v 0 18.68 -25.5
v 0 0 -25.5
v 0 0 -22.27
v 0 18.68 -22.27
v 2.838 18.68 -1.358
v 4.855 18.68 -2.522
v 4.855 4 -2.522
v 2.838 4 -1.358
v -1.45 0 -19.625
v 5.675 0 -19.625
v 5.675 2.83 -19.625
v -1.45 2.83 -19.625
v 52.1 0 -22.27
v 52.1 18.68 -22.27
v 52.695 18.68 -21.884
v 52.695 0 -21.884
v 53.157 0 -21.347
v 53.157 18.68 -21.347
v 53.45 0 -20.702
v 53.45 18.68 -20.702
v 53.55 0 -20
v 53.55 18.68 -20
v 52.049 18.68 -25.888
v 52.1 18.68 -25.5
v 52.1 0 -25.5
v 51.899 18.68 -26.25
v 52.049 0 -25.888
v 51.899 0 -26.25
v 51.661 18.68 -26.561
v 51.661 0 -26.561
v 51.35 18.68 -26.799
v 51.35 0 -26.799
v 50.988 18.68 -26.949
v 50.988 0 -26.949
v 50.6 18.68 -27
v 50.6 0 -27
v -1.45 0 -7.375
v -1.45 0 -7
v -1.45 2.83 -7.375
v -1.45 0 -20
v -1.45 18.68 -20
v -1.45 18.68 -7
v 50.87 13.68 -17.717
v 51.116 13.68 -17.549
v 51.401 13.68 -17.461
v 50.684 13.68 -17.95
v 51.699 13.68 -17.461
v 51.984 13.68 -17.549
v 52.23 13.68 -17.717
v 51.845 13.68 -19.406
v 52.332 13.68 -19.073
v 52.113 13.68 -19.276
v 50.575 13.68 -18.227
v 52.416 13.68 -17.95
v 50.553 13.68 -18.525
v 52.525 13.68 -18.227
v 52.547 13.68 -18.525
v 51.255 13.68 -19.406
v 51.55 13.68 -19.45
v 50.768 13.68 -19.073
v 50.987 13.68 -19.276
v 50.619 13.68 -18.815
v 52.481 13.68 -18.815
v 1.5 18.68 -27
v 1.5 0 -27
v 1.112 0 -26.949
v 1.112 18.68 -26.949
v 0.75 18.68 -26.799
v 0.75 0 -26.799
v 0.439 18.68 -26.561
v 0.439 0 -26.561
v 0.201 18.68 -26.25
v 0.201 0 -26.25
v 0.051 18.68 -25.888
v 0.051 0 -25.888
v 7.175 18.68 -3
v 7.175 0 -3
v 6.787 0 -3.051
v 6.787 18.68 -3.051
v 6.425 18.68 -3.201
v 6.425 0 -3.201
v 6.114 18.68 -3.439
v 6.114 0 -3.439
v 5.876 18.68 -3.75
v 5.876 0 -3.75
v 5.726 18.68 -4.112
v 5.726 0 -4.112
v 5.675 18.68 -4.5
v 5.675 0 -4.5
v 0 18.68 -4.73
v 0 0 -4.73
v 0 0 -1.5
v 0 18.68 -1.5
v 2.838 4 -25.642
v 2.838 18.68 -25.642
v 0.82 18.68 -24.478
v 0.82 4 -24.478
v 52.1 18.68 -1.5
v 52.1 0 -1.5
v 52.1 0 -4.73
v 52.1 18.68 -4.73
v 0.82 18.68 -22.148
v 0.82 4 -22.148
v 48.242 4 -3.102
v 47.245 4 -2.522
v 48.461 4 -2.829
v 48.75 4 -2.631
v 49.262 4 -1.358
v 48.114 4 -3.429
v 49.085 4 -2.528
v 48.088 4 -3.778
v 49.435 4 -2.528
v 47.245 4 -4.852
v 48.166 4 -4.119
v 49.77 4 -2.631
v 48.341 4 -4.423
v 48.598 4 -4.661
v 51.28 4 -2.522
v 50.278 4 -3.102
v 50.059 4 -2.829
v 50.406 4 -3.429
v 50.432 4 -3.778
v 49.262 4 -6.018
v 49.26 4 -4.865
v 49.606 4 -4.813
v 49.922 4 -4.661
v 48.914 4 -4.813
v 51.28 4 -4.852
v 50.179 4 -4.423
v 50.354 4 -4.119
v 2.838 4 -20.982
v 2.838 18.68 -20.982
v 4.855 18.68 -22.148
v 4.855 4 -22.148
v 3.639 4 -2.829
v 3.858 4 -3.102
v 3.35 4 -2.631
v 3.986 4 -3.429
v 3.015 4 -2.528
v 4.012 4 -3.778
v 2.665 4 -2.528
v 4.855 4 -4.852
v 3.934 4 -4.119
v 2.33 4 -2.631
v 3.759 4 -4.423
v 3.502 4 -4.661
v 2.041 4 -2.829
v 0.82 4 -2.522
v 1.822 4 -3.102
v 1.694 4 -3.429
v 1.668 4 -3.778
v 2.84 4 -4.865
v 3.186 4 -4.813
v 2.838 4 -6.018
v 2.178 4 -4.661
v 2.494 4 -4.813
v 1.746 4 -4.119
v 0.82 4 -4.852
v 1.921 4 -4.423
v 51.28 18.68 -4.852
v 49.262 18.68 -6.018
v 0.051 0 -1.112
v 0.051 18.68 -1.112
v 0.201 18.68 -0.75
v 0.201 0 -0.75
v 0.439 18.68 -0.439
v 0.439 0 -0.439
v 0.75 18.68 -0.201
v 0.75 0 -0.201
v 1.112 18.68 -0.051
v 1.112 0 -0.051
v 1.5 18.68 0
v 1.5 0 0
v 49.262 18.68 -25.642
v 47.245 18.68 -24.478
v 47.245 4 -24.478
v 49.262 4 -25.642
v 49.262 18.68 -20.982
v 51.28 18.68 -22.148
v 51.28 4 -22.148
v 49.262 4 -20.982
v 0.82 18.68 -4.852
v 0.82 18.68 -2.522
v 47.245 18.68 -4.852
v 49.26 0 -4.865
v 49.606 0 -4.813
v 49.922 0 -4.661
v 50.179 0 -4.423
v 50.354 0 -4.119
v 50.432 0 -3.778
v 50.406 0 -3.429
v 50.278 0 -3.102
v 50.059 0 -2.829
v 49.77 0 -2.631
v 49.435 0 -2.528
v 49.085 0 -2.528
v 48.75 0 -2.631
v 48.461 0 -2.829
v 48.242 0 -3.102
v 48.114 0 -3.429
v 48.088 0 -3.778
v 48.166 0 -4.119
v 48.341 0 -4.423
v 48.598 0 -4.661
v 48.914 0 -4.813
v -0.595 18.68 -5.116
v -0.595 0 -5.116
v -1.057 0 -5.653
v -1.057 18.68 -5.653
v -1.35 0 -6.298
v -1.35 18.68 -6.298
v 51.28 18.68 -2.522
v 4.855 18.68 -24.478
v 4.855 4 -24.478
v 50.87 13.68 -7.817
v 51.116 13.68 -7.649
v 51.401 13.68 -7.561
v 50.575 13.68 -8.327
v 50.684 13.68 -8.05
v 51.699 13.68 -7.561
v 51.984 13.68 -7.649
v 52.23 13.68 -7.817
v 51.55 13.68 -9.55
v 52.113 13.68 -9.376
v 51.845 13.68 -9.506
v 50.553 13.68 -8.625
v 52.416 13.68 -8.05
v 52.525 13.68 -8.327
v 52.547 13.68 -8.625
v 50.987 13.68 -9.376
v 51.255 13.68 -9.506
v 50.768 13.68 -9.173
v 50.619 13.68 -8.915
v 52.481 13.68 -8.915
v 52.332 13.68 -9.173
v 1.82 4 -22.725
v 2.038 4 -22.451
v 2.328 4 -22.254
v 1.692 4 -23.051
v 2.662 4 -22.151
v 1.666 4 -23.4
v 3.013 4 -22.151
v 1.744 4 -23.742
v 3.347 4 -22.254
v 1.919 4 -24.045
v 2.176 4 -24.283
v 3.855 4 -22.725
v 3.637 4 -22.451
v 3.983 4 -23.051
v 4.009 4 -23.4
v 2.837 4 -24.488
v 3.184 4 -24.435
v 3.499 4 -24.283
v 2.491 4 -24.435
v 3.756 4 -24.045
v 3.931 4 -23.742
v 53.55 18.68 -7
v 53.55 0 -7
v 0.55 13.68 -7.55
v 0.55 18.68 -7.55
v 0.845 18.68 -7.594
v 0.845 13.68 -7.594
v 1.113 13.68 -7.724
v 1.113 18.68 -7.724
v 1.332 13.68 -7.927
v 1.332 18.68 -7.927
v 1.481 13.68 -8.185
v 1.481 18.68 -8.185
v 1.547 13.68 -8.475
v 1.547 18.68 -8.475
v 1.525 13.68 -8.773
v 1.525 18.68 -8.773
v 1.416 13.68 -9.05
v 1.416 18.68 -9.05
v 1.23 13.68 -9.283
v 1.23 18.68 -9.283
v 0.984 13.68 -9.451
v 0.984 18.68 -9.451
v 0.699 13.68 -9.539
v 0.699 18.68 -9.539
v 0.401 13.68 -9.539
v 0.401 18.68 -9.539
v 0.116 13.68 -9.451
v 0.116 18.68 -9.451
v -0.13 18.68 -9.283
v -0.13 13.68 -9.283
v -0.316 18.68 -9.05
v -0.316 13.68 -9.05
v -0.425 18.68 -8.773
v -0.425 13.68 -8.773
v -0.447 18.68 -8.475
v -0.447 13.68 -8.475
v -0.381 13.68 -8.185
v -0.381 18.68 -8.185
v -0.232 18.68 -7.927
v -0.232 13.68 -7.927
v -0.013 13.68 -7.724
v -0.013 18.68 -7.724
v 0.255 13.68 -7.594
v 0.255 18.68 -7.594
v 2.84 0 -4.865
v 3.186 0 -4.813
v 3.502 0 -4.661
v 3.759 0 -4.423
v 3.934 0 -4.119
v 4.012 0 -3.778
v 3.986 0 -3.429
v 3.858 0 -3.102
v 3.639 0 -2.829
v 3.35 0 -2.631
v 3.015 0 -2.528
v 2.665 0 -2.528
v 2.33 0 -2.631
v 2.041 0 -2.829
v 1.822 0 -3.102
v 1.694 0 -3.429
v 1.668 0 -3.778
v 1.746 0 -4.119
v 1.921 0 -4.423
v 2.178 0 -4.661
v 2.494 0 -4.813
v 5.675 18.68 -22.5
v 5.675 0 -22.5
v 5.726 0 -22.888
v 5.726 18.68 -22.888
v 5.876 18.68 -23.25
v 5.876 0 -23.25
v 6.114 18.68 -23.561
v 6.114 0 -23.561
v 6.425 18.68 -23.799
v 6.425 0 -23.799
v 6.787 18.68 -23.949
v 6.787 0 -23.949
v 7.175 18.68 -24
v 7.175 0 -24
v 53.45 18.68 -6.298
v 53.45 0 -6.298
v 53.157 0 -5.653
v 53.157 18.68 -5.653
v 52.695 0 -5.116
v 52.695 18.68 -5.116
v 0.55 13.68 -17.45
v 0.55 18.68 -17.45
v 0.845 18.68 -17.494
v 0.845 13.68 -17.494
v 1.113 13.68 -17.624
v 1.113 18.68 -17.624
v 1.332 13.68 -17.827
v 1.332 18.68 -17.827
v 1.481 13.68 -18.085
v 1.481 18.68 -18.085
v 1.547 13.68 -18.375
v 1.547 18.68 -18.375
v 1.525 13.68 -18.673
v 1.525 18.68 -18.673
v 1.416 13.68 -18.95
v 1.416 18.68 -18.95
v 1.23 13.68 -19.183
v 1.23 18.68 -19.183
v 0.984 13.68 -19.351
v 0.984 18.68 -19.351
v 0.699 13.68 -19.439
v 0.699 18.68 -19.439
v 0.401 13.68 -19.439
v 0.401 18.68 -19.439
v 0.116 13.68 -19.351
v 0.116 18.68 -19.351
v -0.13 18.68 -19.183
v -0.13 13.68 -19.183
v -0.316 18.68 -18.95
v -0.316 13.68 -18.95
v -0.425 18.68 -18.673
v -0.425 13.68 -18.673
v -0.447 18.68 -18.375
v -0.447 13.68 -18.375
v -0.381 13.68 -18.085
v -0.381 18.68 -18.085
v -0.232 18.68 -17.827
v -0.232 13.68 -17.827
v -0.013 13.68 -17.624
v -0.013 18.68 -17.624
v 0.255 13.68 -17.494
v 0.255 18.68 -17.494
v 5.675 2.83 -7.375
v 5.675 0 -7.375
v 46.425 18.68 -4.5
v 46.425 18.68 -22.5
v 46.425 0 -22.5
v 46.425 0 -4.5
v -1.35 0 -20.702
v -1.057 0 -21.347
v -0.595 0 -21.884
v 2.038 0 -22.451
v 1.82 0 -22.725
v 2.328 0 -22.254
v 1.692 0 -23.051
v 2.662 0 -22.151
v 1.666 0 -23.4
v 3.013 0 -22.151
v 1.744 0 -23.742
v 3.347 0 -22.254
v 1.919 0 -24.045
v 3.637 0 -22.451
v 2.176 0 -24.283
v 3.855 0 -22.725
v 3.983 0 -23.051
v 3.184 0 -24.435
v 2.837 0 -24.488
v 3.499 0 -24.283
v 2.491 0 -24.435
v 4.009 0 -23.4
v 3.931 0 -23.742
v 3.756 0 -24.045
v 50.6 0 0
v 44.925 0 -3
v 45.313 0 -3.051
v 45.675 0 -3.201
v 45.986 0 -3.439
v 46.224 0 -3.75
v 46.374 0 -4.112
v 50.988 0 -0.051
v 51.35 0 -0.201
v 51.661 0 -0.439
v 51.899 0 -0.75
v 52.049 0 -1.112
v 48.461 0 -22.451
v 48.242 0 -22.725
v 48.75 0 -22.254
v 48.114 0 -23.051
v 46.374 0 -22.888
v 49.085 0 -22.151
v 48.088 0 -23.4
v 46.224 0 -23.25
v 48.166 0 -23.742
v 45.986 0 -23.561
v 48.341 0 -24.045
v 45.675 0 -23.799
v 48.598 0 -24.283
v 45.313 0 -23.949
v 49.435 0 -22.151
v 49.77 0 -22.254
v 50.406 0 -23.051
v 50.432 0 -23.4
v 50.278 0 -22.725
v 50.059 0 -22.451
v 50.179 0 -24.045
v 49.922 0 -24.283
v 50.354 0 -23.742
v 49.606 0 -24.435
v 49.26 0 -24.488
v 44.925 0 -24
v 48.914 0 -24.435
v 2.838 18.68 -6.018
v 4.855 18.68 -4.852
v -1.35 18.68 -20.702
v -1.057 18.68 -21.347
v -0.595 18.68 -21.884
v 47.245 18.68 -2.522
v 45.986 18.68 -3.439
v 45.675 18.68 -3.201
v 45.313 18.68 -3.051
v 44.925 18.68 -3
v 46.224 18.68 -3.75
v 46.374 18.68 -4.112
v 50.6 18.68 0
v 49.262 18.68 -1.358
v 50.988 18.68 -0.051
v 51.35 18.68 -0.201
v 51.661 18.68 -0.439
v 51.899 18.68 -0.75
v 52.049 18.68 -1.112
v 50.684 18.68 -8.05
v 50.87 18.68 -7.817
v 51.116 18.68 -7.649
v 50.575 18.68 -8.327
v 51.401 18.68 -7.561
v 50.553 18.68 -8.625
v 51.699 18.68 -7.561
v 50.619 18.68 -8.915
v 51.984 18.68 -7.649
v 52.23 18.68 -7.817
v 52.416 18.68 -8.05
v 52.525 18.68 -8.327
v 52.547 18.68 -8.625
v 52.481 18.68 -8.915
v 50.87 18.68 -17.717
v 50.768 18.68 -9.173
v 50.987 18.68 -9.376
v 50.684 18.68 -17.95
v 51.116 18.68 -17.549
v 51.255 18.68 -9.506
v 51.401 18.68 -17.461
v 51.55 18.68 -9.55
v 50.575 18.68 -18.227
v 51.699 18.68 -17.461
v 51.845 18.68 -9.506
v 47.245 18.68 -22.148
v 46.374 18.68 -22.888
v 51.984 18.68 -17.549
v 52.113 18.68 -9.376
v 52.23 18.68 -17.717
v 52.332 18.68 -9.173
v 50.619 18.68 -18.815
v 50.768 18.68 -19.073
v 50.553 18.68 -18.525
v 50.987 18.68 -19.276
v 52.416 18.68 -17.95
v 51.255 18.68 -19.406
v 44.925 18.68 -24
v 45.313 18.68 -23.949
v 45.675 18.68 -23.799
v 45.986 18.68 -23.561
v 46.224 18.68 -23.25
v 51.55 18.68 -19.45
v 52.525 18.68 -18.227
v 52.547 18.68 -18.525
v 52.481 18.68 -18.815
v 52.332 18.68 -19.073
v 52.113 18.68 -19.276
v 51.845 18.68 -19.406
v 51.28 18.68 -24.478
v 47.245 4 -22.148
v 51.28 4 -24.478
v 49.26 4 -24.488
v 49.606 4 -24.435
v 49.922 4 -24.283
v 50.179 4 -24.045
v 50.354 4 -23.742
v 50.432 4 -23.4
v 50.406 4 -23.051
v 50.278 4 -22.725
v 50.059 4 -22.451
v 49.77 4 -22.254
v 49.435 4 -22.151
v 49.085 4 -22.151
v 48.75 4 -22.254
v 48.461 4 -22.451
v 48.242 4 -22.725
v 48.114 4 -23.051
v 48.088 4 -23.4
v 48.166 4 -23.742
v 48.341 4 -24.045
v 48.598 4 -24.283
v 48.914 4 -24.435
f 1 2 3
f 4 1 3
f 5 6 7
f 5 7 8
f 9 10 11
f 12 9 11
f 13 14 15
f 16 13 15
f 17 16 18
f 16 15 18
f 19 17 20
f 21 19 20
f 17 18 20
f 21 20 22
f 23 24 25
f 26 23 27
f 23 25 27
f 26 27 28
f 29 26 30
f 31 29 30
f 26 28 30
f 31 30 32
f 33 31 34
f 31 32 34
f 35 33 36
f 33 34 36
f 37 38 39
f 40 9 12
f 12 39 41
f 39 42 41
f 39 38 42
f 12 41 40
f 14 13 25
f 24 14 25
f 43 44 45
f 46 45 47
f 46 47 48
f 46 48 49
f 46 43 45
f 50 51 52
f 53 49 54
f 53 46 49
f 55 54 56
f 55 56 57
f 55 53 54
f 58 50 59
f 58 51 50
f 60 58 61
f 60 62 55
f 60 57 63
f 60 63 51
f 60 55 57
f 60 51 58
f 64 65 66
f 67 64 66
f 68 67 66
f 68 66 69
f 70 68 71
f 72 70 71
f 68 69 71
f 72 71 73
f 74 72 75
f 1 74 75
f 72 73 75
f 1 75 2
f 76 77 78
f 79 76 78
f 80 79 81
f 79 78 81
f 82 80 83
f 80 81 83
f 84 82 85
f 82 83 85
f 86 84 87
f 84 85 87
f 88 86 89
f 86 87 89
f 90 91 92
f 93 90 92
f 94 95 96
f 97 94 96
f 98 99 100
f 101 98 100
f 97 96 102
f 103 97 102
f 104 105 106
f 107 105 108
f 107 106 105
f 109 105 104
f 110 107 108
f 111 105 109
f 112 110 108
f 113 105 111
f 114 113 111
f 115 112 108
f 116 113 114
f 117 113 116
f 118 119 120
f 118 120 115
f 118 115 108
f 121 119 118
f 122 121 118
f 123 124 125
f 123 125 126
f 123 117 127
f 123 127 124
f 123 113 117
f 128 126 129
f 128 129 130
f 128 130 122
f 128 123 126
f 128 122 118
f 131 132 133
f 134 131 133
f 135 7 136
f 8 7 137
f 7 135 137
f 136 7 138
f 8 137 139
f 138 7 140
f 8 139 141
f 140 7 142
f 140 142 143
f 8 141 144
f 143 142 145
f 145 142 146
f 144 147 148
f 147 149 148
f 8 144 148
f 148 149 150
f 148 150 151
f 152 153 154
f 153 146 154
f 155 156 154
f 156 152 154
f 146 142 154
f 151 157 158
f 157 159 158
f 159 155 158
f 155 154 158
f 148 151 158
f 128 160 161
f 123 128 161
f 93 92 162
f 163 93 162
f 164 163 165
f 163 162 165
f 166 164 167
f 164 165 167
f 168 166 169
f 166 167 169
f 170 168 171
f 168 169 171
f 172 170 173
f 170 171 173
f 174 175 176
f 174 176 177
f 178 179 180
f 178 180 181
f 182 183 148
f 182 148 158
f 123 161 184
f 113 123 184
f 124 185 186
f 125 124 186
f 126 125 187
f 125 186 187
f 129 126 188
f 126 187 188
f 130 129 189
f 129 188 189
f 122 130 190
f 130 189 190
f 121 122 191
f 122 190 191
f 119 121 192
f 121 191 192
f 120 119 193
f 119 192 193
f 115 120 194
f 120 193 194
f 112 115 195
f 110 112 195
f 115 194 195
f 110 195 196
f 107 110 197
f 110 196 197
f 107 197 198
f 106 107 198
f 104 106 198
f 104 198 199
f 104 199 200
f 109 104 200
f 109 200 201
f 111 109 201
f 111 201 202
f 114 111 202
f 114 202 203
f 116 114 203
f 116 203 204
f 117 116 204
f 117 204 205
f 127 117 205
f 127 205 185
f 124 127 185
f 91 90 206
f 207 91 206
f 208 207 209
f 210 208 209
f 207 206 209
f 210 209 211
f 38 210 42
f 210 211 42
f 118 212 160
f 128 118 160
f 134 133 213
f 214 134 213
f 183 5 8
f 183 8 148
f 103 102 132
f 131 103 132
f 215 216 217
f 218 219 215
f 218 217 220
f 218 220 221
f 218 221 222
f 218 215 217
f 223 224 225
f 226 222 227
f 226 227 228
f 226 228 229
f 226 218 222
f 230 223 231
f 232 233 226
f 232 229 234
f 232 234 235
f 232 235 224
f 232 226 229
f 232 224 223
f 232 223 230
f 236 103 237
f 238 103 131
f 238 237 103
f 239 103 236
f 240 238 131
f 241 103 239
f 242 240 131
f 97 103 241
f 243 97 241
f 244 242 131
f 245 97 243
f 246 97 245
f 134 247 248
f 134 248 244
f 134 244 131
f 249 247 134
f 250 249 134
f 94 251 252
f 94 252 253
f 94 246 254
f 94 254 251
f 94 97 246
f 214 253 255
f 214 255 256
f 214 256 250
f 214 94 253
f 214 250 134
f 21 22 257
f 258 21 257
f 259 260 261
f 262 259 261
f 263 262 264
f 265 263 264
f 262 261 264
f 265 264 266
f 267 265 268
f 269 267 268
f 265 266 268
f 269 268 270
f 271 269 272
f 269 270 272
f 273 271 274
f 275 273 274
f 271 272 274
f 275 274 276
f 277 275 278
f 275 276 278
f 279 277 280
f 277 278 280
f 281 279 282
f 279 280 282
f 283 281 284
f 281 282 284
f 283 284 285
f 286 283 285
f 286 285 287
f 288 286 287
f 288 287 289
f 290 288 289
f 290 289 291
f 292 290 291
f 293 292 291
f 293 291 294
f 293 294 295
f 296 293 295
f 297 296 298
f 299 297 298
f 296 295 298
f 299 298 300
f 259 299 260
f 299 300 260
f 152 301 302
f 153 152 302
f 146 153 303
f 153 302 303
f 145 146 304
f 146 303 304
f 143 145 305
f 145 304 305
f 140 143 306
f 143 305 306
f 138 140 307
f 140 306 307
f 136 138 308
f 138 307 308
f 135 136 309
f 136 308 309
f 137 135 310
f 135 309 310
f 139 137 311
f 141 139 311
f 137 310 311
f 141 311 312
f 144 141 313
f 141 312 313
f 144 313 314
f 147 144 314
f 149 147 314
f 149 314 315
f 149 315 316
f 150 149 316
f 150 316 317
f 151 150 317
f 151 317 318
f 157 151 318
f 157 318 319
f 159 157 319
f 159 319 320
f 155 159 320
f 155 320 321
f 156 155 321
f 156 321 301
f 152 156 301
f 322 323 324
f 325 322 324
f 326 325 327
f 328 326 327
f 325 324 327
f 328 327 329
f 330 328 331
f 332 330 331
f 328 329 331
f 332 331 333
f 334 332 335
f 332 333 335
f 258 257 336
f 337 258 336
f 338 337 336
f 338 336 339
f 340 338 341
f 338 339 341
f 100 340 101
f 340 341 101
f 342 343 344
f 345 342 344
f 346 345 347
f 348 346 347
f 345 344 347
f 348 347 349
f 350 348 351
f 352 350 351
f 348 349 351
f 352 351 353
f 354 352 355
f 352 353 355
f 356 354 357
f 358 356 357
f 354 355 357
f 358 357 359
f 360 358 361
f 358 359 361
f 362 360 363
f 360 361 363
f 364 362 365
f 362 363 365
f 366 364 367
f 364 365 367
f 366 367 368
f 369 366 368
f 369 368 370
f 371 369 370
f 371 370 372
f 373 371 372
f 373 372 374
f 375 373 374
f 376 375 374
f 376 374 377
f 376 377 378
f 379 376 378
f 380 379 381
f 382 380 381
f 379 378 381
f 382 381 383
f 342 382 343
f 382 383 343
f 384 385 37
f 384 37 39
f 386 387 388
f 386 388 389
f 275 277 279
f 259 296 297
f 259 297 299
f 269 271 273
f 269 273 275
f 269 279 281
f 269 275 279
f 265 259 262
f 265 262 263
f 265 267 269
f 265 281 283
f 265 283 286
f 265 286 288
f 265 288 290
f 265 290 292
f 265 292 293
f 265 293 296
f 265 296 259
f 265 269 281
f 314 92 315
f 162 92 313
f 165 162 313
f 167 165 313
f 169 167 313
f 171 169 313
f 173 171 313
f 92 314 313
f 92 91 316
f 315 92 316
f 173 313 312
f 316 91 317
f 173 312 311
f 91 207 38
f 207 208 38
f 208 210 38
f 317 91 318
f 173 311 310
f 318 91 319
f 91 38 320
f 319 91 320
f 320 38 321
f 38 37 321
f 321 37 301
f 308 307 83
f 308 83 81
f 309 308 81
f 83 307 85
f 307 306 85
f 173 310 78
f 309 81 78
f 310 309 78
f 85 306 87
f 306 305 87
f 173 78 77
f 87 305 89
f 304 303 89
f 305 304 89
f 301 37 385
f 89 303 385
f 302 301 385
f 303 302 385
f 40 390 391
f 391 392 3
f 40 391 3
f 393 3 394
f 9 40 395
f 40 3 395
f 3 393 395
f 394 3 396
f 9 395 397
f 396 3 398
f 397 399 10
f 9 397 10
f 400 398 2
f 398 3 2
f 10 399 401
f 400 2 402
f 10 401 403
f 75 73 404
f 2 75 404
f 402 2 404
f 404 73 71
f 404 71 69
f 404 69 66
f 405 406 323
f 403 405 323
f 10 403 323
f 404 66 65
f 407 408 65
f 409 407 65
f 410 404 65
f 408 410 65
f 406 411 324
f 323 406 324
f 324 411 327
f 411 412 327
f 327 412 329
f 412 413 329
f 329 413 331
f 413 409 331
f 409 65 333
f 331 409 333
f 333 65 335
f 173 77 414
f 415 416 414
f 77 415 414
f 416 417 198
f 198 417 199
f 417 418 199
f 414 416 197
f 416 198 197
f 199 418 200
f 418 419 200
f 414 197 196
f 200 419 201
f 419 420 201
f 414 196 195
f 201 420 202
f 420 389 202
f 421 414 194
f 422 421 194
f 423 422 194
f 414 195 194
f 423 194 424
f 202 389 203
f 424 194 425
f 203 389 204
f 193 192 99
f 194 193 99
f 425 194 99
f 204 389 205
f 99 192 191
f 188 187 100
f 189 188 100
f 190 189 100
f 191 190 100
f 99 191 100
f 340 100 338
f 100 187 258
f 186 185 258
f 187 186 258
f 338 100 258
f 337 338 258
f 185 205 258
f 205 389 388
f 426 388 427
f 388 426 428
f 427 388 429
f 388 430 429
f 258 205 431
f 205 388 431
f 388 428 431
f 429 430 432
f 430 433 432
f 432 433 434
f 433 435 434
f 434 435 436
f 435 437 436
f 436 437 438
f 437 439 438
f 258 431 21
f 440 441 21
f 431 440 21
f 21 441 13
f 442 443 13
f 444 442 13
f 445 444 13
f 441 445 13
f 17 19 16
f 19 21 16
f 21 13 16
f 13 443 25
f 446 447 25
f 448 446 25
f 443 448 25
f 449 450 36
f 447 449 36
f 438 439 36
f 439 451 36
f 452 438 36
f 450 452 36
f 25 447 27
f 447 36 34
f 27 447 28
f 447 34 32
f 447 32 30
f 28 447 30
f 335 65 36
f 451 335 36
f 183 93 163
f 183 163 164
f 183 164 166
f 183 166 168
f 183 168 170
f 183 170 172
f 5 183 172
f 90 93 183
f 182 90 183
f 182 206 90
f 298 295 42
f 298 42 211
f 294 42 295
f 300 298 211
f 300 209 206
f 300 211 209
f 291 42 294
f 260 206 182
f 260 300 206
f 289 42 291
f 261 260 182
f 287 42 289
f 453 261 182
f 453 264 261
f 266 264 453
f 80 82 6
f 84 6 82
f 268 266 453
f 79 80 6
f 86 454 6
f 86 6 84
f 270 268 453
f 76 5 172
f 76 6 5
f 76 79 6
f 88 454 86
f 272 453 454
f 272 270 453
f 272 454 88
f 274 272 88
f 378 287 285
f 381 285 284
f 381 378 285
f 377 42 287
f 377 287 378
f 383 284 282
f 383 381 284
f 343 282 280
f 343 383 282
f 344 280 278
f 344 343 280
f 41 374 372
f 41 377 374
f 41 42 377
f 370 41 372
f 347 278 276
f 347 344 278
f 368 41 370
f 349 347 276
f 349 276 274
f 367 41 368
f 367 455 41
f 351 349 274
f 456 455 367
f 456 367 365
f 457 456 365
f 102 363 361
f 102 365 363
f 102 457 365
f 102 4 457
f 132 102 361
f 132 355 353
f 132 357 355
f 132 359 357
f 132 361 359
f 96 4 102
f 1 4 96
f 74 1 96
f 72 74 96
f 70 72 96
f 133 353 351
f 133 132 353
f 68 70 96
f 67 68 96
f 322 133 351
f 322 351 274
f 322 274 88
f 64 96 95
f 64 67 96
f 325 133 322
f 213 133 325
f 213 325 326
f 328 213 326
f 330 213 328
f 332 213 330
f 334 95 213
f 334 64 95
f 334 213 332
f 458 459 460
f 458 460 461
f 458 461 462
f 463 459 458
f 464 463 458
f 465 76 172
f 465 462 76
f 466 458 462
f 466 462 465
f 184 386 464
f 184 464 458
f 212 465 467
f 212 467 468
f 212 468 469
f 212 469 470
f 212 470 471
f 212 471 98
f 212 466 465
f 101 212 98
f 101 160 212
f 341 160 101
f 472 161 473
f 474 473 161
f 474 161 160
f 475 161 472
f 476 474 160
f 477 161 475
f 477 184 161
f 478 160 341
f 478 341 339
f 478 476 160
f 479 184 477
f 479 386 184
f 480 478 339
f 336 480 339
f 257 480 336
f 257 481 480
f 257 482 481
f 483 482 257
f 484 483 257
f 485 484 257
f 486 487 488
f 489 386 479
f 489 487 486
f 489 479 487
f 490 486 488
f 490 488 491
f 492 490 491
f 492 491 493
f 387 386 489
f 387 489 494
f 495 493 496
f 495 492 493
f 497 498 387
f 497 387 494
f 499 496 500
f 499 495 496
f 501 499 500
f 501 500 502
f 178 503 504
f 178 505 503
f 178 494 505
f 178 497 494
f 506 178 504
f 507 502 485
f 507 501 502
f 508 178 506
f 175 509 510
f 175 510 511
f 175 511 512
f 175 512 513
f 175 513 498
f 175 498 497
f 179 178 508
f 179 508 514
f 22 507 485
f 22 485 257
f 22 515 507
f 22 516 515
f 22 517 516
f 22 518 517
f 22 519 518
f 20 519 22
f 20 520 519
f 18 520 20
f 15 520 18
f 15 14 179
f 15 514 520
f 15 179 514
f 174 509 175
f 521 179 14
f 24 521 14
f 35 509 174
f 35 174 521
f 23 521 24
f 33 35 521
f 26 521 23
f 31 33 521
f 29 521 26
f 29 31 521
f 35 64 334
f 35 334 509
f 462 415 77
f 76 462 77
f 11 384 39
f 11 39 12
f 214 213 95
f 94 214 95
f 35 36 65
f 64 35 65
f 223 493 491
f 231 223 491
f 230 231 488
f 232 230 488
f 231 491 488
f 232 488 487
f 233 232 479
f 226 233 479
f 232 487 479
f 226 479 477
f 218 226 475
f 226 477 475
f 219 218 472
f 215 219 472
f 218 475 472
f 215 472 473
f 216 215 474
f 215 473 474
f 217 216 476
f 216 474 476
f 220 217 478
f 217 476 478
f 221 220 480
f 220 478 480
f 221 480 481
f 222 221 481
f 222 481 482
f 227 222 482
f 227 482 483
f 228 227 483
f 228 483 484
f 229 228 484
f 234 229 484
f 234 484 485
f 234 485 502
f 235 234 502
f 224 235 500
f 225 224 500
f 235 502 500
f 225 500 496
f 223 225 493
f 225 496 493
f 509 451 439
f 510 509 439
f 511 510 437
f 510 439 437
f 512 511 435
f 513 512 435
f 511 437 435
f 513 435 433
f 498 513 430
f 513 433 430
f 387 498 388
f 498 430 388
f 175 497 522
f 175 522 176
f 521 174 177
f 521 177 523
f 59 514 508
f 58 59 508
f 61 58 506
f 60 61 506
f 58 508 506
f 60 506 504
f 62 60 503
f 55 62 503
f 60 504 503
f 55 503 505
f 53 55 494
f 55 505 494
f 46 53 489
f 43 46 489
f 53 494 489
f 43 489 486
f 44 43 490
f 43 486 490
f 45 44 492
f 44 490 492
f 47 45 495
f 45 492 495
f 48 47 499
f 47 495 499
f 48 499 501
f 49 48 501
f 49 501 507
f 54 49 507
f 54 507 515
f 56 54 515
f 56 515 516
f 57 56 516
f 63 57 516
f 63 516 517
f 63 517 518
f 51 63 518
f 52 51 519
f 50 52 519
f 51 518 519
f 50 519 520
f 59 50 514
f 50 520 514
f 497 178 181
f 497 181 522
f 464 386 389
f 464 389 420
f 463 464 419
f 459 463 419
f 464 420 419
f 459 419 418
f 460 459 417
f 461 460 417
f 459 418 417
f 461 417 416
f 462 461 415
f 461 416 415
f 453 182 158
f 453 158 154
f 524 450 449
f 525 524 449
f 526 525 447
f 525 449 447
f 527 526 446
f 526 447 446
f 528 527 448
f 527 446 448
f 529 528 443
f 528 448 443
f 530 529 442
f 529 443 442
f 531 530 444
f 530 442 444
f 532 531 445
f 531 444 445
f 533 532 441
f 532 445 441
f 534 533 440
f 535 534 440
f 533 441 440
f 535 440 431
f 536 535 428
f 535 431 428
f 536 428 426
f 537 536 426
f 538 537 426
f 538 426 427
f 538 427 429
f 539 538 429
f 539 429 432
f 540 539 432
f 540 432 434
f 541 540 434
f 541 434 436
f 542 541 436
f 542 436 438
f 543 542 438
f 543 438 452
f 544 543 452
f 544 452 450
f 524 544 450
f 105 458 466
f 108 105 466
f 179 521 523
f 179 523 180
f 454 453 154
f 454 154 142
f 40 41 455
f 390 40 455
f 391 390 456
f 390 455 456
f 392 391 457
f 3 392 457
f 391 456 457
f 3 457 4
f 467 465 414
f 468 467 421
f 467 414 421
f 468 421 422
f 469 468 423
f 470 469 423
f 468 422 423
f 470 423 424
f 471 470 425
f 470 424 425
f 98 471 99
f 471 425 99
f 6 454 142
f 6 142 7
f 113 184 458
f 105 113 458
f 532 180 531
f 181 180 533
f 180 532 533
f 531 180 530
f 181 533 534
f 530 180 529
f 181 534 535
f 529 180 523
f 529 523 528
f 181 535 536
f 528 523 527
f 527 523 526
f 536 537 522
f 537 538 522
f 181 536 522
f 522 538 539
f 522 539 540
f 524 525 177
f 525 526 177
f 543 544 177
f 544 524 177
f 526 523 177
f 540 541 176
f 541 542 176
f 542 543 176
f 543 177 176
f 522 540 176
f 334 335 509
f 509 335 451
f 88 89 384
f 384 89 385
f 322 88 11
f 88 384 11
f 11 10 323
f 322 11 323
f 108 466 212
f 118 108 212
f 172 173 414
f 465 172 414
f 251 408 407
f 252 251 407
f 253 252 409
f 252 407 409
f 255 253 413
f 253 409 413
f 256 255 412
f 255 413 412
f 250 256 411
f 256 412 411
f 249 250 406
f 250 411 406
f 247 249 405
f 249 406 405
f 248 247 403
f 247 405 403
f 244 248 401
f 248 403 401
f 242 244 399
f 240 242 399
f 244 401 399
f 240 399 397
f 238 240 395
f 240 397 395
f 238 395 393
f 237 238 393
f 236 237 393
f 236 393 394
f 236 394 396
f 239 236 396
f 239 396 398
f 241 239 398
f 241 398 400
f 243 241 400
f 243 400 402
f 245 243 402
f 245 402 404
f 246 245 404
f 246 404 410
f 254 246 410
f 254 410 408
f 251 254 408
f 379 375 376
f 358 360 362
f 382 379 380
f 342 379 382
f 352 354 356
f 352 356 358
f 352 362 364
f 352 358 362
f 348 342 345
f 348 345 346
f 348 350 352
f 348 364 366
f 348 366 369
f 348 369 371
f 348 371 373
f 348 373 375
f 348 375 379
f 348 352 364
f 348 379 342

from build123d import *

# Parameters (mm, degrees)
SALIENTE_EXTRUIR1_DEPTH = 18.68
SALIENTE_EXTRUIR2_DEPTH = 18.68
CROQUIS3_W              = 12.25
CROQUIS3_H              = 2.83
CORTAR_EXTRUIR1_DEPTH   = 59.051339796
CROQUIS4_R              = 1.175
CORTAR_EXTRUIR2_DEPTH   = 63.813572819
CORTAR_EXTRUIR3_DEPTH   = 14.68
CROQUIS6_R              = 1
CORTAR_EXTRUIR4_DEPTH   = 5


with BuildPart() as part:
    # Croquis1 → Saliente-Extruir1 (new body)
    with BuildSketch(Plane(origin=(0, 0, 0), x_dir=(1, 0, 0), z_dir=(0, 1, 0))):
        with BuildLine():
            Line((1.5, 0), (50.6, 0))
            ThreePointArc((50.6, 0), (51.660660172, 0.439339828), (52.1, 1.5))
            Line((52.1, 1.5), (52.1, 25.5))
            ThreePointArc((52.1, 25.5), (51.660660172, 26.560660172), (50.6, 27))
            Line((50.6, 27), (1.5, 27))
            ThreePointArc((1.5, 27), (0.439339828, 26.560660172), (0, 25.5))
            Line((0, 25.5), (0, 1.5))
            ThreePointArc((0, 1.5), (0.439339828, 0.439339828), (1.5, 0))
        make_face()
        with BuildLine():
            Line((7.175, 24), (44.925, 24))
            ThreePointArc((44.925, 24), (45.985660172, 23.560660172), (46.425, 22.5))
            Line((46.425, 22.5), (46.425, 4.5))
            ThreePointArc((46.425, 4.5), (45.985660172, 3.439339828), (44.925, 3))
            Line((44.925, 3), (7.175, 3))
            ThreePointArc((7.175, 3), (6.114339828, 3.439339828), (5.675, 4.5))
            Line((5.675, 4.5), (5.675, 22.5))
            ThreePointArc((5.675, 22.5), (6.114339828, 23.560660172), (7.175, 24))
        make_face(mode=Mode.SUBTRACT)
    extrude(amount=SALIENTE_EXTRUIR1_DEPTH)

    # Croquis2 → Saliente-Extruir2 (add)
    with BuildSketch(Plane(origin=(0, 18.68, 0), x_dir=(1, 0, 0), z_dir=(0, 1, 0))):
        with BuildLine():
            Line((0, 22.27), (0, 4.73))
            ThreePointArc((0, 4.73), (-1.056857895, 5.653020288), (-1.45, 7))
            Line((-1.45, 7), (-1.45, 20))
            ThreePointArc((-1.45, 20), (-1.056857895, 21.346979712), (0, 22.27))
        make_face()
        with BuildLine():
            Line((53.55, 20), (53.55, 7))
            ThreePointArc((53.55, 7), (53.156857895, 5.653020288), (52.1, 4.73))
            Line((52.1, 4.73), (52.1, 22.27))
            ThreePointArc((52.1, 22.27), (53.156857895, 21.346979712), (53.55, 20))
        make_face()
    extrude(amount=-SALIENTE_EXTRUIR2_DEPTH)

    # Croquis3 → Cortar-Extruir1 (cut, through all)
    with BuildSketch(Plane(origin=(5.675, 0, 0), x_dir=(0, 0, -1), z_dir=(1, 0, 0))):
        with Locations((13.5, 1.415)):
            Rectangle(CROQUIS3_W, CROQUIS3_H)
    extrude(amount=-CORTAR_EXTRUIR1_DEPTH, mode=Mode.SUBTRACT)

    # Croquis4 → Cortar-Extruir2 (cut, through all)
    with BuildSketch(Plane.XZ):
        with Locations(Location((49.26, -23.3125, 0), (0, 0, 270))):
            Circle(CROQUIS4_R)
        with Locations(Location((2.8375, -23.3125, 0), (0, 0, 270))):
            Circle(CROQUIS4_R)
        with Locations(Location((49.26, -3.69, 0), (0, 0, 270))):
            Circle(CROQUIS4_R)
        with Locations(Location((2.84, -3.69, 0), (0, 0, 270))):
            Circle(CROQUIS4_R)
    extrude(amount=-CORTAR_EXTRUIR2_DEPTH, mode=Mode.SUBTRACT)

    # Croquis5 → Cortar-Extruir3 (cut)
    with BuildSketch(Plane(origin=(0, 18.68, 0), x_dir=(1, 0, 0), z_dir=(0, 1, 0))):
        Polygon((2.8375, 25.6425), (0.819660809, 24.4775), (0.819660809, 22.1475), (2.8375, 20.9825), (4.855339191, 22.1475), (4.855339191, 24.4775), align=None)
        Polygon((47.244660809, 24.4775), (49.2625, 25.6425), (51.280339191, 24.4775), (51.280339191, 22.1475), (49.2625, 20.9825), (47.244660809, 22.1475), align=None)
        Polygon((49.2625, 1.3575), (51.280339191, 2.5225), (51.280339191, 4.8525), (49.2625, 6.0175), (47.244660809, 4.8525), (47.244660809, 2.5225), align=None)
        Polygon((4.855339191, 2.5225), (2.8375, 1.3575), (0.819660809, 2.5225), (0.819660809, 4.8525), (2.8375, 6.0175), (4.855339191, 4.8525), align=None)
    extrude(amount=-CORTAR_EXTRUIR3_DEPTH, mode=Mode.SUBTRACT)

    # Croquis6 → Cortar-Extruir4 (cut)
    with BuildSketch(Plane(origin=(0, 18.68, 0), x_dir=(1, 0, 0), z_dir=(0, 1, 0))):
        with Locations(Location((0.55, 18.45, 0), (0, 0, 270))):
            Circle(CROQUIS6_R)
        with Locations(Location((0.55, 8.55, 0), (0, 0, 270))):
            Circle(CROQUIS6_R)
        with Locations(Location((51.55, 8.55, 0), (0, 0, 90))):
            Circle(CROQUIS6_R)
        with Locations(Location((51.55, 18.45, 0), (0, 0, 90))):
            Circle(CROQUIS6_R)
    extrude(amount=-CORTAR_EXTRUIR4_DEPTH, mode=Mode.SUBTRACT)


solid = part.part
